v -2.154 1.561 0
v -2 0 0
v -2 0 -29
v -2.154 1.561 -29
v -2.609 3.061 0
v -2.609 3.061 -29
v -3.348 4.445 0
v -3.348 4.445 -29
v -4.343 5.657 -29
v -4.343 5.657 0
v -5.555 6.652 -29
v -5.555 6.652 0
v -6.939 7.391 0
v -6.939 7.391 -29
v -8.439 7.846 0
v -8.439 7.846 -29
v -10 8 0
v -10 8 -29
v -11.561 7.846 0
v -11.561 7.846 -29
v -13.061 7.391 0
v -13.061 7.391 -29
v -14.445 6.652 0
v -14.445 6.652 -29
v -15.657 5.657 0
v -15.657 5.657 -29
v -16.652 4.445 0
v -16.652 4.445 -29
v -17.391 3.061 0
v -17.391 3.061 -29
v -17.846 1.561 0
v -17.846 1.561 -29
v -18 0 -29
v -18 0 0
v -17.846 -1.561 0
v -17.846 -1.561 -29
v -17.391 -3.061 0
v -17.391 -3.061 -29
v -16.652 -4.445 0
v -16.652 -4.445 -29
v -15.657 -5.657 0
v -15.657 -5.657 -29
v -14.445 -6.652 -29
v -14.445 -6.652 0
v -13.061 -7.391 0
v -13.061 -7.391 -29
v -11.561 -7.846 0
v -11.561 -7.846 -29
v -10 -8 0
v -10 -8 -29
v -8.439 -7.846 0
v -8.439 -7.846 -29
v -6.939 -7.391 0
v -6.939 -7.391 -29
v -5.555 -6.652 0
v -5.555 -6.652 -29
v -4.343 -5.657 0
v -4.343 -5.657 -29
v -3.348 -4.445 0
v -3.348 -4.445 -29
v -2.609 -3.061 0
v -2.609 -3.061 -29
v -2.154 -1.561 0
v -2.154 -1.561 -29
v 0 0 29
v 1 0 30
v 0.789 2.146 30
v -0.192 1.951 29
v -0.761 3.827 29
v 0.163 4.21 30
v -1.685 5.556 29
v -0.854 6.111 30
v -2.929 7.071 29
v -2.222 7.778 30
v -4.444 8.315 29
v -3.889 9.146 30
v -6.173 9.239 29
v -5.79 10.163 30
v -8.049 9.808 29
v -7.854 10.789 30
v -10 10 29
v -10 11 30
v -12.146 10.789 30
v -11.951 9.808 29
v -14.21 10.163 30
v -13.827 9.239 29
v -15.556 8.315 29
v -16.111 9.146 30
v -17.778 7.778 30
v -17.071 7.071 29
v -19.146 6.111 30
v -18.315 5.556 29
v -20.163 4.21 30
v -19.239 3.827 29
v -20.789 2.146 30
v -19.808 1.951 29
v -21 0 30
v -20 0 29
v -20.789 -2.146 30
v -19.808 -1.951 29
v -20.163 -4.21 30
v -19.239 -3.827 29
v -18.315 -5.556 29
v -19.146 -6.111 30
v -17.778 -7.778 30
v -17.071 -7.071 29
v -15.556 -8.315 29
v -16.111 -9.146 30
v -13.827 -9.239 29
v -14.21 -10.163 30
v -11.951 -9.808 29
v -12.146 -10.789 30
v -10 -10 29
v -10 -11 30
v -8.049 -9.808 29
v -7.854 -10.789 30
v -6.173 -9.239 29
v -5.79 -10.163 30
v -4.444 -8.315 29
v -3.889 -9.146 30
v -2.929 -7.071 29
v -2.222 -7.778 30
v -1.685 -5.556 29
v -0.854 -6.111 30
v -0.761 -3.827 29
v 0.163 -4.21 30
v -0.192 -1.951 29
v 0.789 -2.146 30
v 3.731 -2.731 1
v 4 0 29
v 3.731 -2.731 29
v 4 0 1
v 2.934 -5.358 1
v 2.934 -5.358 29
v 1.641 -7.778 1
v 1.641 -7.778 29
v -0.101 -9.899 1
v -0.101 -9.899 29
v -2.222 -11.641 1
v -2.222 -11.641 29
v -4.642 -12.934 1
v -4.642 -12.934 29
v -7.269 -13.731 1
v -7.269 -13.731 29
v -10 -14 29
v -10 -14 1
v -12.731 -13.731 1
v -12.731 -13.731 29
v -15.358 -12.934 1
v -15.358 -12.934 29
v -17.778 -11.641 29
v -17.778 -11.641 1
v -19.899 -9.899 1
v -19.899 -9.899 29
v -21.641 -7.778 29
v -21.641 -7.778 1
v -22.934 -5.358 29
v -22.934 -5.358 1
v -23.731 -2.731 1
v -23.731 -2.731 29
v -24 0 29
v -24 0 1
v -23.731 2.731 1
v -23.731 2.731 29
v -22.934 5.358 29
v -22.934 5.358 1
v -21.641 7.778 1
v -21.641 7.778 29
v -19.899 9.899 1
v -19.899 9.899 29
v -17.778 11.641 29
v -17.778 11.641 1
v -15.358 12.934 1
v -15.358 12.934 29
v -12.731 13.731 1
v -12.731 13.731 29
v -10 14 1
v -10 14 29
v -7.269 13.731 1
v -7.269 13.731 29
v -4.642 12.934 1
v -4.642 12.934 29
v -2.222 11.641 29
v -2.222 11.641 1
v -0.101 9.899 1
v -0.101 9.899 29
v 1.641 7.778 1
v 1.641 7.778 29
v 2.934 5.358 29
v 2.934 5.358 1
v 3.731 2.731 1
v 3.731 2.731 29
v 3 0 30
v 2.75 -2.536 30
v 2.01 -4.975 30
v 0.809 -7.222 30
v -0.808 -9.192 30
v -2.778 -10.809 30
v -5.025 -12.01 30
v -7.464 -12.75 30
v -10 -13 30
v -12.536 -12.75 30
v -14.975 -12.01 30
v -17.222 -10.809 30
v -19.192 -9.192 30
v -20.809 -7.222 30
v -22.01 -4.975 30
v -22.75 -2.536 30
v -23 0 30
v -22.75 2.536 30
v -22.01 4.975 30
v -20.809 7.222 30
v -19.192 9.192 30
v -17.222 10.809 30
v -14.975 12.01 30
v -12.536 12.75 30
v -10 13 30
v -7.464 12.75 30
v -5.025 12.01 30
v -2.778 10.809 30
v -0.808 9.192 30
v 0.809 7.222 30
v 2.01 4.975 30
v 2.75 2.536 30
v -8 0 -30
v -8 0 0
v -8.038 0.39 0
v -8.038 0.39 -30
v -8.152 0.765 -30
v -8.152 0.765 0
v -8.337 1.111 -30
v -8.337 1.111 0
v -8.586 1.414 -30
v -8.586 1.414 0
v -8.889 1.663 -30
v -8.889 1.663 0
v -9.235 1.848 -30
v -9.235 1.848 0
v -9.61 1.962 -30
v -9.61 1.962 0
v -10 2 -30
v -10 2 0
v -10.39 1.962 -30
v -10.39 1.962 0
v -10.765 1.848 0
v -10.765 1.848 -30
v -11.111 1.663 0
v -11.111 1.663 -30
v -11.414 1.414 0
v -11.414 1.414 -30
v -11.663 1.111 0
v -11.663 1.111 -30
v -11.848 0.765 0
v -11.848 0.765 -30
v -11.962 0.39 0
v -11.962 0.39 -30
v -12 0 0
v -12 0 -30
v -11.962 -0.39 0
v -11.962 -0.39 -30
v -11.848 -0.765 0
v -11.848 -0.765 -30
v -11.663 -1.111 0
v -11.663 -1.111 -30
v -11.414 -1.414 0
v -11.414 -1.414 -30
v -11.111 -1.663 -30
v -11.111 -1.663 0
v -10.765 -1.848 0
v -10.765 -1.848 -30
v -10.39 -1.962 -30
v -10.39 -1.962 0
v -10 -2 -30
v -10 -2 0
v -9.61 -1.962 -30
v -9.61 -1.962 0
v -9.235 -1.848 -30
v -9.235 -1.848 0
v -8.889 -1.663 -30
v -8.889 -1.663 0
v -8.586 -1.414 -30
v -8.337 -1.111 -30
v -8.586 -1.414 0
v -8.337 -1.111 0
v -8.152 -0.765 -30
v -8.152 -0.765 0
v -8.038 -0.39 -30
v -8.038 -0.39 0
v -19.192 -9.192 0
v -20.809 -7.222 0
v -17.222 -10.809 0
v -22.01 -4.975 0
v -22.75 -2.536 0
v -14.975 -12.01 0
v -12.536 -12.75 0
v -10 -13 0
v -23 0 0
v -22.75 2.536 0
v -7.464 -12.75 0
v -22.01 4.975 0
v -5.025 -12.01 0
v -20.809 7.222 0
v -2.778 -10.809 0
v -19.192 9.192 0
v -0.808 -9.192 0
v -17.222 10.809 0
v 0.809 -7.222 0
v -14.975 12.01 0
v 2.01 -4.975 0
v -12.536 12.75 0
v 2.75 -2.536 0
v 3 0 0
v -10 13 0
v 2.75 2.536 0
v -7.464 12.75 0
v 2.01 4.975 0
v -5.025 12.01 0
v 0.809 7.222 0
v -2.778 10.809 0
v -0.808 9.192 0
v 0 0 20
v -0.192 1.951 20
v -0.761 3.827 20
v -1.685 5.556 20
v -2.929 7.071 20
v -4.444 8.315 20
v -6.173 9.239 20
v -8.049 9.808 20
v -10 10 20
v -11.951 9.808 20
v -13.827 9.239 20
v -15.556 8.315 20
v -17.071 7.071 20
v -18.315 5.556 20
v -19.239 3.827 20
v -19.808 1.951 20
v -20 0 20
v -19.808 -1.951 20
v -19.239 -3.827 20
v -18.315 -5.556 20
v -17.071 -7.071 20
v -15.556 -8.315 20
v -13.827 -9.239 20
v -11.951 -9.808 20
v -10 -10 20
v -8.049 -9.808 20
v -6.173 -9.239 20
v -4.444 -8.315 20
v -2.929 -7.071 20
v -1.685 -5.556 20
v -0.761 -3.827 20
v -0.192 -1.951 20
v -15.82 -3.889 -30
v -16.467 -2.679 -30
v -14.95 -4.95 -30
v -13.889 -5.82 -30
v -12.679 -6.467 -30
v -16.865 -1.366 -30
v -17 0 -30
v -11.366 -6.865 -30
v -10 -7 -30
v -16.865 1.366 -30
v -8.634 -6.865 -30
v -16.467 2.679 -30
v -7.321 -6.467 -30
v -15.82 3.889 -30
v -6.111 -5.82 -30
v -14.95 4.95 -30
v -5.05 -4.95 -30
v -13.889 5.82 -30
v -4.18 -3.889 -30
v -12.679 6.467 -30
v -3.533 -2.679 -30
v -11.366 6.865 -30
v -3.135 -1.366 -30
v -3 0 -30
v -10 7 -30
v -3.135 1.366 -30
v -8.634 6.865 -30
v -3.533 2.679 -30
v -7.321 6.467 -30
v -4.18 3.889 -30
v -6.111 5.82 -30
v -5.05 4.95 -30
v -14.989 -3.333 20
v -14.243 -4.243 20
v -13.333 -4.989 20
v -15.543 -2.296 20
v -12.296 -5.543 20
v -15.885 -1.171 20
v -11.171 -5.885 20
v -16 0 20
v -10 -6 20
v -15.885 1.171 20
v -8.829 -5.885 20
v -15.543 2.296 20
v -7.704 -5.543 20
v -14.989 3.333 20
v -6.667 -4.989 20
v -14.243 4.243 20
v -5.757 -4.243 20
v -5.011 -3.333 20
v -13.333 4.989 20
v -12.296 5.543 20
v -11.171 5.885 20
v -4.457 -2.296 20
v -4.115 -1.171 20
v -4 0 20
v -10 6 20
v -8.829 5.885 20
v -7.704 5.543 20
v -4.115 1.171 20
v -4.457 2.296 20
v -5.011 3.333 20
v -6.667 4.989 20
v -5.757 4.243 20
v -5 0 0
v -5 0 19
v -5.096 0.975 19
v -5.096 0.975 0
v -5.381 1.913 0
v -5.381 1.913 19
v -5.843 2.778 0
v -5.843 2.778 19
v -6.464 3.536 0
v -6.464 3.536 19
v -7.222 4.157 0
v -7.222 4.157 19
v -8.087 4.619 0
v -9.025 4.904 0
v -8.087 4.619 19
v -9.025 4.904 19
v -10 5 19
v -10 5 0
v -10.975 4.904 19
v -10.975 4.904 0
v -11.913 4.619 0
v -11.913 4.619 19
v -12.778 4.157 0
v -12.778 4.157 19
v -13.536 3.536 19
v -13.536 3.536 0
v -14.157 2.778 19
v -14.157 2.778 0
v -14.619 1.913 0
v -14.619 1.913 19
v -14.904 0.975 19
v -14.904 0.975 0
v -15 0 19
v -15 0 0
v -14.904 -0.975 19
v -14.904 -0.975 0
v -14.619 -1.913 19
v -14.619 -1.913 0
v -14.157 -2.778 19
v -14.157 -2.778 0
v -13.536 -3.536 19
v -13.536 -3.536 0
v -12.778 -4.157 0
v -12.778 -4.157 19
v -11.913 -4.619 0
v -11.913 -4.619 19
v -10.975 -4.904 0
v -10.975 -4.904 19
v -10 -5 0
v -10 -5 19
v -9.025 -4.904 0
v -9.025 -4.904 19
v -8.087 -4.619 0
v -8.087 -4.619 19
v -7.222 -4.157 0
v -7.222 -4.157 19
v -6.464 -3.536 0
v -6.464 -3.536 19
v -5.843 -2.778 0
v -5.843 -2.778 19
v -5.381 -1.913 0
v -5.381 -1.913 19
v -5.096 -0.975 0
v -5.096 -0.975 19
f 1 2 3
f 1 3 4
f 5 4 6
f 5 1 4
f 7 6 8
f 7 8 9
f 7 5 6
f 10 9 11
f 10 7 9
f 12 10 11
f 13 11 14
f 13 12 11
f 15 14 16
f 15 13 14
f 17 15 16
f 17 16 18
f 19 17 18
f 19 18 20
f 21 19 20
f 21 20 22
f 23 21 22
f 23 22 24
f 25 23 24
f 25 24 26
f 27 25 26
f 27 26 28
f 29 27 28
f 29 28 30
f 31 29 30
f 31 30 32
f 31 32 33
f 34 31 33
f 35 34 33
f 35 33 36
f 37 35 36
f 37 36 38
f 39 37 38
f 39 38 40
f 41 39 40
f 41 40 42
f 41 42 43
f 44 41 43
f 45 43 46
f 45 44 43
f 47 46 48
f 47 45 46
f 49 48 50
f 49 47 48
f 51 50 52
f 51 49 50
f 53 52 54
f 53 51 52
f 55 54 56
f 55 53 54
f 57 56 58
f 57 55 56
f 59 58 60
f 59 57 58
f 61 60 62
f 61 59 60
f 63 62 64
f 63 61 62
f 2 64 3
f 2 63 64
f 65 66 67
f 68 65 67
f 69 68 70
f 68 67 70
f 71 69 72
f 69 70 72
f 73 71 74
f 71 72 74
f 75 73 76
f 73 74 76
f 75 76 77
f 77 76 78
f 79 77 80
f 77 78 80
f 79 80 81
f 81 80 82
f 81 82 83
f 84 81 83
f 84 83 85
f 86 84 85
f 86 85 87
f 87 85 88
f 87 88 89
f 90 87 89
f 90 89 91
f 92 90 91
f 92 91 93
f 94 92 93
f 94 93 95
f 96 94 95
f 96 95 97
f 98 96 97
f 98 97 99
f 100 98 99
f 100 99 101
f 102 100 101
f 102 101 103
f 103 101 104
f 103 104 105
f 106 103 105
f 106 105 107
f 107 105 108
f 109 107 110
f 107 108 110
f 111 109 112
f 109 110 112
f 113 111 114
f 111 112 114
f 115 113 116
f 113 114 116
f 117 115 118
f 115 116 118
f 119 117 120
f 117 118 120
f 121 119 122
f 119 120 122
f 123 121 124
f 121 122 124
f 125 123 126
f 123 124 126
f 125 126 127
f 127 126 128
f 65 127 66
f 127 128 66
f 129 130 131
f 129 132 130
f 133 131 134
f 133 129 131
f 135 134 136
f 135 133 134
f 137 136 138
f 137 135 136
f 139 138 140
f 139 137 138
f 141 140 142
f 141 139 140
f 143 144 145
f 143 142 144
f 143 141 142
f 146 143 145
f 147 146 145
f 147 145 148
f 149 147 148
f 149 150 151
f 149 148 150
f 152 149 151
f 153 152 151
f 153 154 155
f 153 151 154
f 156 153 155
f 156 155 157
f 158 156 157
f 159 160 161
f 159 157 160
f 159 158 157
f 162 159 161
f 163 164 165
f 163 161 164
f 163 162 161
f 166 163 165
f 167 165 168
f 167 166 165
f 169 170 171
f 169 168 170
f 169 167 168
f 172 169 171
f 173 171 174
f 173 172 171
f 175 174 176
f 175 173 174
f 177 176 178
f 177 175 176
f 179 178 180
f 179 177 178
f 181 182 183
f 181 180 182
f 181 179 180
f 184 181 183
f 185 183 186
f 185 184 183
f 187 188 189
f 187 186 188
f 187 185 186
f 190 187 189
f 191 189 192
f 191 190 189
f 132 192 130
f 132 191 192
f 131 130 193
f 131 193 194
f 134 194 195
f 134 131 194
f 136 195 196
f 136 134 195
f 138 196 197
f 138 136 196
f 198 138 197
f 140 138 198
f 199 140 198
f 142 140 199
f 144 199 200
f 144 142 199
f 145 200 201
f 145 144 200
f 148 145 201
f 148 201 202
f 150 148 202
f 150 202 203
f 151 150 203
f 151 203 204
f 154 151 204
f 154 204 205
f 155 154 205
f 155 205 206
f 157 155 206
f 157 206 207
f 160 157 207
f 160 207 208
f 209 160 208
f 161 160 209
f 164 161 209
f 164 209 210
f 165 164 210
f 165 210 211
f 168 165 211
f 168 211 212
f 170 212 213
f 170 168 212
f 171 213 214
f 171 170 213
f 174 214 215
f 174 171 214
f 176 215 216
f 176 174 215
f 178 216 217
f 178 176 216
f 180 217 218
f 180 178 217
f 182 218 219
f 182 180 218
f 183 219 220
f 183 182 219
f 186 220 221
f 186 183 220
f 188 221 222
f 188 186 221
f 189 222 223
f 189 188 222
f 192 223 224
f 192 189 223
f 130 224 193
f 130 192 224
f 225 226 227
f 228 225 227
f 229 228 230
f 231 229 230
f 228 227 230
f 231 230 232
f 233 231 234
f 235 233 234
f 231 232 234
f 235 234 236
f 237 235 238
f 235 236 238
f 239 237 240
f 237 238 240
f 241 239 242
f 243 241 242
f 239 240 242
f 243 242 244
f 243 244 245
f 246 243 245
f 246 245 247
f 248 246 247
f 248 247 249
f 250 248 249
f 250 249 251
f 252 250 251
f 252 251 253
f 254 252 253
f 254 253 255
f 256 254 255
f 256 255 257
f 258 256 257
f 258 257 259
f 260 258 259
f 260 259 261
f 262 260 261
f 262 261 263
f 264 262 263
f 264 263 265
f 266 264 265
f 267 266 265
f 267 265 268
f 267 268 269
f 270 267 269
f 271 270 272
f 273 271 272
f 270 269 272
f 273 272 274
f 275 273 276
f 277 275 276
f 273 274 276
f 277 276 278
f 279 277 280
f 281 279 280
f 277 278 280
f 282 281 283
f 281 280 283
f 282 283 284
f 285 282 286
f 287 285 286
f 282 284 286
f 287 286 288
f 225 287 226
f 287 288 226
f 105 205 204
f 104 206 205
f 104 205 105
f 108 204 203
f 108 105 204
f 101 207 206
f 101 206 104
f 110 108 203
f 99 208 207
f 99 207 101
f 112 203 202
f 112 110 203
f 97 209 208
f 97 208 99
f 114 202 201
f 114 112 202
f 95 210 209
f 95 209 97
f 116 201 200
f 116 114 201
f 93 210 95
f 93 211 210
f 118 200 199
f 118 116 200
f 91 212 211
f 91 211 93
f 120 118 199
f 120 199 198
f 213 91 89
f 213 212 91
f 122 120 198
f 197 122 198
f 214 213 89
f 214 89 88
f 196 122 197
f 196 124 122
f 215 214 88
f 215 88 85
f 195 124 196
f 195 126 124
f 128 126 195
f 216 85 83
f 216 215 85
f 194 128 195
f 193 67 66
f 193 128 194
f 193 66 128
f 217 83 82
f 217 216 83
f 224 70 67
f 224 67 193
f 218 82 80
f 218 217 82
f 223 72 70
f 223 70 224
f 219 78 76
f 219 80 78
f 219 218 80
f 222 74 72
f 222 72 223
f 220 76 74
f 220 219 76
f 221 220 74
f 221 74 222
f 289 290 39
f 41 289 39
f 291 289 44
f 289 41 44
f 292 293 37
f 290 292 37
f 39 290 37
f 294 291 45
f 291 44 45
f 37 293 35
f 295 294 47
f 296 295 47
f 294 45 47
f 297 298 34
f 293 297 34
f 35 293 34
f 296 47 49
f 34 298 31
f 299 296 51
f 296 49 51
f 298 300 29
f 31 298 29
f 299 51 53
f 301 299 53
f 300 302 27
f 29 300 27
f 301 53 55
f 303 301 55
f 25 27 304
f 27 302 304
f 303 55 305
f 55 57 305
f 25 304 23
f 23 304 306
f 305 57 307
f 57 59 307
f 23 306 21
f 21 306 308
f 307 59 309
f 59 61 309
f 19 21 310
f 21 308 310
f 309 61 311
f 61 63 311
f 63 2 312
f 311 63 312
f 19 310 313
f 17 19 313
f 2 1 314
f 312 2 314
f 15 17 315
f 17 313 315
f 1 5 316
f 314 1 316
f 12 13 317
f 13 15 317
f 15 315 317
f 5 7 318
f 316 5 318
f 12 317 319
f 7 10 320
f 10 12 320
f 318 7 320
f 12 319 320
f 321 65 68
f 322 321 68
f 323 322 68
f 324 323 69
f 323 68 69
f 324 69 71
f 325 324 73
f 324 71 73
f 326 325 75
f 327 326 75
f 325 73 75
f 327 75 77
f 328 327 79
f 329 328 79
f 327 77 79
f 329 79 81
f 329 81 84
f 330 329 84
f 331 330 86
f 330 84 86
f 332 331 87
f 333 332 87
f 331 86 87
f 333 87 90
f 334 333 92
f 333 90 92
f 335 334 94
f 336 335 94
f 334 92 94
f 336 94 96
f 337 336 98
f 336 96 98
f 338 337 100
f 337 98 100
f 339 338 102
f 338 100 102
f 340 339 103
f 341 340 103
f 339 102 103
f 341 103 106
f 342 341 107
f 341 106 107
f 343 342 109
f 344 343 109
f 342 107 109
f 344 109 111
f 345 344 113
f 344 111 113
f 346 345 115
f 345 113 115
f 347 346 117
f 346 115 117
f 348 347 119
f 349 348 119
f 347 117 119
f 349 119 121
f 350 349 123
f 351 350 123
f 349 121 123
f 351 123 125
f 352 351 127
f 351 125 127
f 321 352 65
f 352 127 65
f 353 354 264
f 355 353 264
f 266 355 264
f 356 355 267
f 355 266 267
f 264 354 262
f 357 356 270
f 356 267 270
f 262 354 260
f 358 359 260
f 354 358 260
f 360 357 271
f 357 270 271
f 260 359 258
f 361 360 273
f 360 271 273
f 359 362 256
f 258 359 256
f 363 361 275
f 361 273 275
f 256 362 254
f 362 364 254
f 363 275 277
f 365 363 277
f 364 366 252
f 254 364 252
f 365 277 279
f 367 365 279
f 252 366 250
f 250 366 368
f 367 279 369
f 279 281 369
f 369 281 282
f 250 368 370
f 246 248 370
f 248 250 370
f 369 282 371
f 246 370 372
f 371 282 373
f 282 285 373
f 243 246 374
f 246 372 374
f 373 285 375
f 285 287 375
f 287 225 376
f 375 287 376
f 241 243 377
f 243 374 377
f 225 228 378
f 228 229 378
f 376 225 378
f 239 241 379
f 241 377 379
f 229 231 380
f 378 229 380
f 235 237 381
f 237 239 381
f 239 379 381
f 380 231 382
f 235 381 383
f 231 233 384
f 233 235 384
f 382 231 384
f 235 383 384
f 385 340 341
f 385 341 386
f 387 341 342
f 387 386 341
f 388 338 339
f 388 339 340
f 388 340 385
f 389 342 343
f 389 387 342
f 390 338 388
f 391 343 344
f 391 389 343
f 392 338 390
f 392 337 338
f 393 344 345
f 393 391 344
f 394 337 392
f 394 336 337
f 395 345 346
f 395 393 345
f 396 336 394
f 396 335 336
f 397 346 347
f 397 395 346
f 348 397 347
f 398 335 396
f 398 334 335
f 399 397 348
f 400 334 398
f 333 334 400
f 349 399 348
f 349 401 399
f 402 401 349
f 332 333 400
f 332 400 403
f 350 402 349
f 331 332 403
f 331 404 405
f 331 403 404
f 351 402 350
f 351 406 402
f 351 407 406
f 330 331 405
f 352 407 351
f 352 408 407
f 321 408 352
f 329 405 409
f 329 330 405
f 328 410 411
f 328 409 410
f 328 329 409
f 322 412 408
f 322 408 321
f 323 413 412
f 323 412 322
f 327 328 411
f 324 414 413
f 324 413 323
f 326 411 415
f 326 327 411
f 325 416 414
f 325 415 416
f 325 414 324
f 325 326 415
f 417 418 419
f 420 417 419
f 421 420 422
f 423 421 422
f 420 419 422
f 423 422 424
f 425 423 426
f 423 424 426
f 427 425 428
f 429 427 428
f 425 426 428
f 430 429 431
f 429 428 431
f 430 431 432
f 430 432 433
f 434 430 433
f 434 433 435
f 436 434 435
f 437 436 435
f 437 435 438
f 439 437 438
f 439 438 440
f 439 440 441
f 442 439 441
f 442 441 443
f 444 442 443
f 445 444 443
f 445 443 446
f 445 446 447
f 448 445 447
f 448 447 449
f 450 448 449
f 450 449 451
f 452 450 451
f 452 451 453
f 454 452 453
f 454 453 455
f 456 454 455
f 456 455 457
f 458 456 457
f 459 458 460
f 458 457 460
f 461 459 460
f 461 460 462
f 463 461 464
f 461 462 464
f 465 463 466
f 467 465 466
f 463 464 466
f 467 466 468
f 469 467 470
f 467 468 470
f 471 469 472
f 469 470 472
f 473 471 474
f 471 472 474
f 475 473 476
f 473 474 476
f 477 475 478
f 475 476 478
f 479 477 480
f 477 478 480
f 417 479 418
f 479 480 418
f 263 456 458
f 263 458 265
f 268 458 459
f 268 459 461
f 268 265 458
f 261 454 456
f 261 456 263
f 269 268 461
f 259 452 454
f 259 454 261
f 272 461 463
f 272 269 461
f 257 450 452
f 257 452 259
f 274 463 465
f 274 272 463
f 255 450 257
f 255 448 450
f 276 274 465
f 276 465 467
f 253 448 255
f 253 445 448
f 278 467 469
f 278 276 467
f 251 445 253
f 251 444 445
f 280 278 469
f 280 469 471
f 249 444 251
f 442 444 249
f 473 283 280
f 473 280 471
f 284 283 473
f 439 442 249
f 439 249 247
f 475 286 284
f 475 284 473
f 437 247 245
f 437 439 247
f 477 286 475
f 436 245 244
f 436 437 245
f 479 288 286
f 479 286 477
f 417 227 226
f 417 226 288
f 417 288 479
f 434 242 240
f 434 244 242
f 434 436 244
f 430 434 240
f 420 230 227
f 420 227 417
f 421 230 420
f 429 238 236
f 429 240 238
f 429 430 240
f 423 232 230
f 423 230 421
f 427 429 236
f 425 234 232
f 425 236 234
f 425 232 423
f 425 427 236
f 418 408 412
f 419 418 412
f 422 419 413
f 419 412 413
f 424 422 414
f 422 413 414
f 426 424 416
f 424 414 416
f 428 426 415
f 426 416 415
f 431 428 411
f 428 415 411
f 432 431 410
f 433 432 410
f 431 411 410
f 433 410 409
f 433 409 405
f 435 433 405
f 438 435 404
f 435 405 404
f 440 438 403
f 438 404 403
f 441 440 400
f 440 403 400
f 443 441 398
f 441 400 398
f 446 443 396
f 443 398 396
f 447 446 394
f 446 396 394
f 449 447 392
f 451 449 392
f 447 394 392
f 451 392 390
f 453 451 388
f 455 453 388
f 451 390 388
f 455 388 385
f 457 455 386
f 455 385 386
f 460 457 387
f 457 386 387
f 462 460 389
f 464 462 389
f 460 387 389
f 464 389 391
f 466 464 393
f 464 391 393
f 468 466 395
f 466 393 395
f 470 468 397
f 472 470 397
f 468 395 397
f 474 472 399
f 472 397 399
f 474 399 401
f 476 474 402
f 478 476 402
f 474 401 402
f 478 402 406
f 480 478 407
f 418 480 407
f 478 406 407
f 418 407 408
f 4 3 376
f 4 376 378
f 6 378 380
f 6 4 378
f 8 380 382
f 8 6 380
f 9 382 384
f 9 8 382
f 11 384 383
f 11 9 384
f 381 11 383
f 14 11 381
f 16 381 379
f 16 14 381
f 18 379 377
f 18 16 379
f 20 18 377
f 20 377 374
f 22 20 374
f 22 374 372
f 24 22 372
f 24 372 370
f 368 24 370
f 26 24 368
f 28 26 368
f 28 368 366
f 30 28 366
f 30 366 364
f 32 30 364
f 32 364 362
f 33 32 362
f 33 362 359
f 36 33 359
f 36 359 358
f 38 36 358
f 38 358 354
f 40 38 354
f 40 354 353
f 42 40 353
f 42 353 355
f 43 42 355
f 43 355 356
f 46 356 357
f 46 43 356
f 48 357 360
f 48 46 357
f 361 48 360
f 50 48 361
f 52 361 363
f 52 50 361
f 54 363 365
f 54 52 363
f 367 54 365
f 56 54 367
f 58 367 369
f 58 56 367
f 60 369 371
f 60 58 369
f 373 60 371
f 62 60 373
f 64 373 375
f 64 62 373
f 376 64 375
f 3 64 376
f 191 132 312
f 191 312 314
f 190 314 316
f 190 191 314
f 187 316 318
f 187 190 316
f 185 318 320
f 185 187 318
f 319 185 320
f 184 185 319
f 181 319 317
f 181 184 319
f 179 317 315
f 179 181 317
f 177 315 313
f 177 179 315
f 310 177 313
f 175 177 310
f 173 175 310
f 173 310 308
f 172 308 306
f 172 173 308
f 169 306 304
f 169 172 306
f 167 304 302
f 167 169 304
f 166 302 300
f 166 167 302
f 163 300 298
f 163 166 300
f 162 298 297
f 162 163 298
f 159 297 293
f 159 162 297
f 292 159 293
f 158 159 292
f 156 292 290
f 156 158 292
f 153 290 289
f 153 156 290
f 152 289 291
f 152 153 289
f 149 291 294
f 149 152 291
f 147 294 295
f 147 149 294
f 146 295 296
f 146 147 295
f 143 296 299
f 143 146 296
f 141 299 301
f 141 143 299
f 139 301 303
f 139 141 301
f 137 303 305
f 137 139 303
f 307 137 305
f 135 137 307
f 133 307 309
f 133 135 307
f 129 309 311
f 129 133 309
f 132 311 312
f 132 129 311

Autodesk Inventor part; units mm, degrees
ref_plane "YZ Plane" through (0, 0, 0) normal (1, 0, 0) x (0, 1, 0)
ref_plane "XZ Plane" through (0, 0, 0) normal (0, 1, 0) x (-1, 0, 0)
ref_plane "XY Plane" through (0, 0, 0) normal (0, 0, 1) x (1, 0, 0)
ref_plane "Płaszczyzna konstrukcyjna1" through (0, 0, 0) normal (0, 0, 1) x (1, 0, 0)
sketch "Szkic1" plane through (0, 0, 0) normal (0, 0, 1) x (1, 0, 0)
  circle A0 centre (-10, 0) radius 10 projected
  circle A1 centre (-10, 0) radius 15
  circle A2 centre (-10, 0) radius 10
  circle A3 centre (-10, 0) radius 8 projected
  circle A4 centre (-10, 0) radius 8
  circle A5 centre (-10, 0) radius 2
  point P0 (0, 0)
  dimension "d0" = 4
extrude "Wyciągnięcie proste1" add sketch "Szkic1" against normal blind 30 contours A3
sketch "Szkic2" plane through (-10, 0, 0) normal (0, 0, 1) x (1, 0, 0)
  circle A0 centre (0, 0) radius 8 projected
  circle A1 centre (0, 0) radius 2 projected
  circle A2 centre (0, 0) radius 2 projected
  circle A3 centre (0, 0) radius 2
  circle A4 centre (0, 0) radius 14 projected
  circle A5 centre (0, 0) radius 14
  point P0 (10, 0)
extrude "Wyciągnięcie proste2" add sketch "Szkic2" along normal blind 30 contours A0 | A4
sketch "Szkic3" plane through (-10, 0, 30) normal (0, 0, 1) x (1, 0, 0)
  circle A0 centre (0, 0) radius 2 projected
  circle A1 centre (0, 0) radius 10
  point P0 (10, 0)
  dimension "d5" = 20
extrude "Wyciągnięcie proste3" cut sketch "Szkic3" against normal blind 10
sketch "Szkic4" plane through (-10, 0, 20) normal (0, 0, 1) x (1, 0, 0)
  circle A0 centre (0, 0) radius 5
  point P0 (10, 0)
  dimension "d8" = 10
extrude "Wyciągnięcie proste4" cut sketch "Szkic4" against normal blind 20
chamfer "Faza1" distance 1 angle 45 5 edges at (-20, 0, 30) (-15, 0, 20) (-24, 0, 30) (-24, 0, 0) (-18, 0, -30)
properties part number "korek" material "Polietylen, o małej gęstości"
